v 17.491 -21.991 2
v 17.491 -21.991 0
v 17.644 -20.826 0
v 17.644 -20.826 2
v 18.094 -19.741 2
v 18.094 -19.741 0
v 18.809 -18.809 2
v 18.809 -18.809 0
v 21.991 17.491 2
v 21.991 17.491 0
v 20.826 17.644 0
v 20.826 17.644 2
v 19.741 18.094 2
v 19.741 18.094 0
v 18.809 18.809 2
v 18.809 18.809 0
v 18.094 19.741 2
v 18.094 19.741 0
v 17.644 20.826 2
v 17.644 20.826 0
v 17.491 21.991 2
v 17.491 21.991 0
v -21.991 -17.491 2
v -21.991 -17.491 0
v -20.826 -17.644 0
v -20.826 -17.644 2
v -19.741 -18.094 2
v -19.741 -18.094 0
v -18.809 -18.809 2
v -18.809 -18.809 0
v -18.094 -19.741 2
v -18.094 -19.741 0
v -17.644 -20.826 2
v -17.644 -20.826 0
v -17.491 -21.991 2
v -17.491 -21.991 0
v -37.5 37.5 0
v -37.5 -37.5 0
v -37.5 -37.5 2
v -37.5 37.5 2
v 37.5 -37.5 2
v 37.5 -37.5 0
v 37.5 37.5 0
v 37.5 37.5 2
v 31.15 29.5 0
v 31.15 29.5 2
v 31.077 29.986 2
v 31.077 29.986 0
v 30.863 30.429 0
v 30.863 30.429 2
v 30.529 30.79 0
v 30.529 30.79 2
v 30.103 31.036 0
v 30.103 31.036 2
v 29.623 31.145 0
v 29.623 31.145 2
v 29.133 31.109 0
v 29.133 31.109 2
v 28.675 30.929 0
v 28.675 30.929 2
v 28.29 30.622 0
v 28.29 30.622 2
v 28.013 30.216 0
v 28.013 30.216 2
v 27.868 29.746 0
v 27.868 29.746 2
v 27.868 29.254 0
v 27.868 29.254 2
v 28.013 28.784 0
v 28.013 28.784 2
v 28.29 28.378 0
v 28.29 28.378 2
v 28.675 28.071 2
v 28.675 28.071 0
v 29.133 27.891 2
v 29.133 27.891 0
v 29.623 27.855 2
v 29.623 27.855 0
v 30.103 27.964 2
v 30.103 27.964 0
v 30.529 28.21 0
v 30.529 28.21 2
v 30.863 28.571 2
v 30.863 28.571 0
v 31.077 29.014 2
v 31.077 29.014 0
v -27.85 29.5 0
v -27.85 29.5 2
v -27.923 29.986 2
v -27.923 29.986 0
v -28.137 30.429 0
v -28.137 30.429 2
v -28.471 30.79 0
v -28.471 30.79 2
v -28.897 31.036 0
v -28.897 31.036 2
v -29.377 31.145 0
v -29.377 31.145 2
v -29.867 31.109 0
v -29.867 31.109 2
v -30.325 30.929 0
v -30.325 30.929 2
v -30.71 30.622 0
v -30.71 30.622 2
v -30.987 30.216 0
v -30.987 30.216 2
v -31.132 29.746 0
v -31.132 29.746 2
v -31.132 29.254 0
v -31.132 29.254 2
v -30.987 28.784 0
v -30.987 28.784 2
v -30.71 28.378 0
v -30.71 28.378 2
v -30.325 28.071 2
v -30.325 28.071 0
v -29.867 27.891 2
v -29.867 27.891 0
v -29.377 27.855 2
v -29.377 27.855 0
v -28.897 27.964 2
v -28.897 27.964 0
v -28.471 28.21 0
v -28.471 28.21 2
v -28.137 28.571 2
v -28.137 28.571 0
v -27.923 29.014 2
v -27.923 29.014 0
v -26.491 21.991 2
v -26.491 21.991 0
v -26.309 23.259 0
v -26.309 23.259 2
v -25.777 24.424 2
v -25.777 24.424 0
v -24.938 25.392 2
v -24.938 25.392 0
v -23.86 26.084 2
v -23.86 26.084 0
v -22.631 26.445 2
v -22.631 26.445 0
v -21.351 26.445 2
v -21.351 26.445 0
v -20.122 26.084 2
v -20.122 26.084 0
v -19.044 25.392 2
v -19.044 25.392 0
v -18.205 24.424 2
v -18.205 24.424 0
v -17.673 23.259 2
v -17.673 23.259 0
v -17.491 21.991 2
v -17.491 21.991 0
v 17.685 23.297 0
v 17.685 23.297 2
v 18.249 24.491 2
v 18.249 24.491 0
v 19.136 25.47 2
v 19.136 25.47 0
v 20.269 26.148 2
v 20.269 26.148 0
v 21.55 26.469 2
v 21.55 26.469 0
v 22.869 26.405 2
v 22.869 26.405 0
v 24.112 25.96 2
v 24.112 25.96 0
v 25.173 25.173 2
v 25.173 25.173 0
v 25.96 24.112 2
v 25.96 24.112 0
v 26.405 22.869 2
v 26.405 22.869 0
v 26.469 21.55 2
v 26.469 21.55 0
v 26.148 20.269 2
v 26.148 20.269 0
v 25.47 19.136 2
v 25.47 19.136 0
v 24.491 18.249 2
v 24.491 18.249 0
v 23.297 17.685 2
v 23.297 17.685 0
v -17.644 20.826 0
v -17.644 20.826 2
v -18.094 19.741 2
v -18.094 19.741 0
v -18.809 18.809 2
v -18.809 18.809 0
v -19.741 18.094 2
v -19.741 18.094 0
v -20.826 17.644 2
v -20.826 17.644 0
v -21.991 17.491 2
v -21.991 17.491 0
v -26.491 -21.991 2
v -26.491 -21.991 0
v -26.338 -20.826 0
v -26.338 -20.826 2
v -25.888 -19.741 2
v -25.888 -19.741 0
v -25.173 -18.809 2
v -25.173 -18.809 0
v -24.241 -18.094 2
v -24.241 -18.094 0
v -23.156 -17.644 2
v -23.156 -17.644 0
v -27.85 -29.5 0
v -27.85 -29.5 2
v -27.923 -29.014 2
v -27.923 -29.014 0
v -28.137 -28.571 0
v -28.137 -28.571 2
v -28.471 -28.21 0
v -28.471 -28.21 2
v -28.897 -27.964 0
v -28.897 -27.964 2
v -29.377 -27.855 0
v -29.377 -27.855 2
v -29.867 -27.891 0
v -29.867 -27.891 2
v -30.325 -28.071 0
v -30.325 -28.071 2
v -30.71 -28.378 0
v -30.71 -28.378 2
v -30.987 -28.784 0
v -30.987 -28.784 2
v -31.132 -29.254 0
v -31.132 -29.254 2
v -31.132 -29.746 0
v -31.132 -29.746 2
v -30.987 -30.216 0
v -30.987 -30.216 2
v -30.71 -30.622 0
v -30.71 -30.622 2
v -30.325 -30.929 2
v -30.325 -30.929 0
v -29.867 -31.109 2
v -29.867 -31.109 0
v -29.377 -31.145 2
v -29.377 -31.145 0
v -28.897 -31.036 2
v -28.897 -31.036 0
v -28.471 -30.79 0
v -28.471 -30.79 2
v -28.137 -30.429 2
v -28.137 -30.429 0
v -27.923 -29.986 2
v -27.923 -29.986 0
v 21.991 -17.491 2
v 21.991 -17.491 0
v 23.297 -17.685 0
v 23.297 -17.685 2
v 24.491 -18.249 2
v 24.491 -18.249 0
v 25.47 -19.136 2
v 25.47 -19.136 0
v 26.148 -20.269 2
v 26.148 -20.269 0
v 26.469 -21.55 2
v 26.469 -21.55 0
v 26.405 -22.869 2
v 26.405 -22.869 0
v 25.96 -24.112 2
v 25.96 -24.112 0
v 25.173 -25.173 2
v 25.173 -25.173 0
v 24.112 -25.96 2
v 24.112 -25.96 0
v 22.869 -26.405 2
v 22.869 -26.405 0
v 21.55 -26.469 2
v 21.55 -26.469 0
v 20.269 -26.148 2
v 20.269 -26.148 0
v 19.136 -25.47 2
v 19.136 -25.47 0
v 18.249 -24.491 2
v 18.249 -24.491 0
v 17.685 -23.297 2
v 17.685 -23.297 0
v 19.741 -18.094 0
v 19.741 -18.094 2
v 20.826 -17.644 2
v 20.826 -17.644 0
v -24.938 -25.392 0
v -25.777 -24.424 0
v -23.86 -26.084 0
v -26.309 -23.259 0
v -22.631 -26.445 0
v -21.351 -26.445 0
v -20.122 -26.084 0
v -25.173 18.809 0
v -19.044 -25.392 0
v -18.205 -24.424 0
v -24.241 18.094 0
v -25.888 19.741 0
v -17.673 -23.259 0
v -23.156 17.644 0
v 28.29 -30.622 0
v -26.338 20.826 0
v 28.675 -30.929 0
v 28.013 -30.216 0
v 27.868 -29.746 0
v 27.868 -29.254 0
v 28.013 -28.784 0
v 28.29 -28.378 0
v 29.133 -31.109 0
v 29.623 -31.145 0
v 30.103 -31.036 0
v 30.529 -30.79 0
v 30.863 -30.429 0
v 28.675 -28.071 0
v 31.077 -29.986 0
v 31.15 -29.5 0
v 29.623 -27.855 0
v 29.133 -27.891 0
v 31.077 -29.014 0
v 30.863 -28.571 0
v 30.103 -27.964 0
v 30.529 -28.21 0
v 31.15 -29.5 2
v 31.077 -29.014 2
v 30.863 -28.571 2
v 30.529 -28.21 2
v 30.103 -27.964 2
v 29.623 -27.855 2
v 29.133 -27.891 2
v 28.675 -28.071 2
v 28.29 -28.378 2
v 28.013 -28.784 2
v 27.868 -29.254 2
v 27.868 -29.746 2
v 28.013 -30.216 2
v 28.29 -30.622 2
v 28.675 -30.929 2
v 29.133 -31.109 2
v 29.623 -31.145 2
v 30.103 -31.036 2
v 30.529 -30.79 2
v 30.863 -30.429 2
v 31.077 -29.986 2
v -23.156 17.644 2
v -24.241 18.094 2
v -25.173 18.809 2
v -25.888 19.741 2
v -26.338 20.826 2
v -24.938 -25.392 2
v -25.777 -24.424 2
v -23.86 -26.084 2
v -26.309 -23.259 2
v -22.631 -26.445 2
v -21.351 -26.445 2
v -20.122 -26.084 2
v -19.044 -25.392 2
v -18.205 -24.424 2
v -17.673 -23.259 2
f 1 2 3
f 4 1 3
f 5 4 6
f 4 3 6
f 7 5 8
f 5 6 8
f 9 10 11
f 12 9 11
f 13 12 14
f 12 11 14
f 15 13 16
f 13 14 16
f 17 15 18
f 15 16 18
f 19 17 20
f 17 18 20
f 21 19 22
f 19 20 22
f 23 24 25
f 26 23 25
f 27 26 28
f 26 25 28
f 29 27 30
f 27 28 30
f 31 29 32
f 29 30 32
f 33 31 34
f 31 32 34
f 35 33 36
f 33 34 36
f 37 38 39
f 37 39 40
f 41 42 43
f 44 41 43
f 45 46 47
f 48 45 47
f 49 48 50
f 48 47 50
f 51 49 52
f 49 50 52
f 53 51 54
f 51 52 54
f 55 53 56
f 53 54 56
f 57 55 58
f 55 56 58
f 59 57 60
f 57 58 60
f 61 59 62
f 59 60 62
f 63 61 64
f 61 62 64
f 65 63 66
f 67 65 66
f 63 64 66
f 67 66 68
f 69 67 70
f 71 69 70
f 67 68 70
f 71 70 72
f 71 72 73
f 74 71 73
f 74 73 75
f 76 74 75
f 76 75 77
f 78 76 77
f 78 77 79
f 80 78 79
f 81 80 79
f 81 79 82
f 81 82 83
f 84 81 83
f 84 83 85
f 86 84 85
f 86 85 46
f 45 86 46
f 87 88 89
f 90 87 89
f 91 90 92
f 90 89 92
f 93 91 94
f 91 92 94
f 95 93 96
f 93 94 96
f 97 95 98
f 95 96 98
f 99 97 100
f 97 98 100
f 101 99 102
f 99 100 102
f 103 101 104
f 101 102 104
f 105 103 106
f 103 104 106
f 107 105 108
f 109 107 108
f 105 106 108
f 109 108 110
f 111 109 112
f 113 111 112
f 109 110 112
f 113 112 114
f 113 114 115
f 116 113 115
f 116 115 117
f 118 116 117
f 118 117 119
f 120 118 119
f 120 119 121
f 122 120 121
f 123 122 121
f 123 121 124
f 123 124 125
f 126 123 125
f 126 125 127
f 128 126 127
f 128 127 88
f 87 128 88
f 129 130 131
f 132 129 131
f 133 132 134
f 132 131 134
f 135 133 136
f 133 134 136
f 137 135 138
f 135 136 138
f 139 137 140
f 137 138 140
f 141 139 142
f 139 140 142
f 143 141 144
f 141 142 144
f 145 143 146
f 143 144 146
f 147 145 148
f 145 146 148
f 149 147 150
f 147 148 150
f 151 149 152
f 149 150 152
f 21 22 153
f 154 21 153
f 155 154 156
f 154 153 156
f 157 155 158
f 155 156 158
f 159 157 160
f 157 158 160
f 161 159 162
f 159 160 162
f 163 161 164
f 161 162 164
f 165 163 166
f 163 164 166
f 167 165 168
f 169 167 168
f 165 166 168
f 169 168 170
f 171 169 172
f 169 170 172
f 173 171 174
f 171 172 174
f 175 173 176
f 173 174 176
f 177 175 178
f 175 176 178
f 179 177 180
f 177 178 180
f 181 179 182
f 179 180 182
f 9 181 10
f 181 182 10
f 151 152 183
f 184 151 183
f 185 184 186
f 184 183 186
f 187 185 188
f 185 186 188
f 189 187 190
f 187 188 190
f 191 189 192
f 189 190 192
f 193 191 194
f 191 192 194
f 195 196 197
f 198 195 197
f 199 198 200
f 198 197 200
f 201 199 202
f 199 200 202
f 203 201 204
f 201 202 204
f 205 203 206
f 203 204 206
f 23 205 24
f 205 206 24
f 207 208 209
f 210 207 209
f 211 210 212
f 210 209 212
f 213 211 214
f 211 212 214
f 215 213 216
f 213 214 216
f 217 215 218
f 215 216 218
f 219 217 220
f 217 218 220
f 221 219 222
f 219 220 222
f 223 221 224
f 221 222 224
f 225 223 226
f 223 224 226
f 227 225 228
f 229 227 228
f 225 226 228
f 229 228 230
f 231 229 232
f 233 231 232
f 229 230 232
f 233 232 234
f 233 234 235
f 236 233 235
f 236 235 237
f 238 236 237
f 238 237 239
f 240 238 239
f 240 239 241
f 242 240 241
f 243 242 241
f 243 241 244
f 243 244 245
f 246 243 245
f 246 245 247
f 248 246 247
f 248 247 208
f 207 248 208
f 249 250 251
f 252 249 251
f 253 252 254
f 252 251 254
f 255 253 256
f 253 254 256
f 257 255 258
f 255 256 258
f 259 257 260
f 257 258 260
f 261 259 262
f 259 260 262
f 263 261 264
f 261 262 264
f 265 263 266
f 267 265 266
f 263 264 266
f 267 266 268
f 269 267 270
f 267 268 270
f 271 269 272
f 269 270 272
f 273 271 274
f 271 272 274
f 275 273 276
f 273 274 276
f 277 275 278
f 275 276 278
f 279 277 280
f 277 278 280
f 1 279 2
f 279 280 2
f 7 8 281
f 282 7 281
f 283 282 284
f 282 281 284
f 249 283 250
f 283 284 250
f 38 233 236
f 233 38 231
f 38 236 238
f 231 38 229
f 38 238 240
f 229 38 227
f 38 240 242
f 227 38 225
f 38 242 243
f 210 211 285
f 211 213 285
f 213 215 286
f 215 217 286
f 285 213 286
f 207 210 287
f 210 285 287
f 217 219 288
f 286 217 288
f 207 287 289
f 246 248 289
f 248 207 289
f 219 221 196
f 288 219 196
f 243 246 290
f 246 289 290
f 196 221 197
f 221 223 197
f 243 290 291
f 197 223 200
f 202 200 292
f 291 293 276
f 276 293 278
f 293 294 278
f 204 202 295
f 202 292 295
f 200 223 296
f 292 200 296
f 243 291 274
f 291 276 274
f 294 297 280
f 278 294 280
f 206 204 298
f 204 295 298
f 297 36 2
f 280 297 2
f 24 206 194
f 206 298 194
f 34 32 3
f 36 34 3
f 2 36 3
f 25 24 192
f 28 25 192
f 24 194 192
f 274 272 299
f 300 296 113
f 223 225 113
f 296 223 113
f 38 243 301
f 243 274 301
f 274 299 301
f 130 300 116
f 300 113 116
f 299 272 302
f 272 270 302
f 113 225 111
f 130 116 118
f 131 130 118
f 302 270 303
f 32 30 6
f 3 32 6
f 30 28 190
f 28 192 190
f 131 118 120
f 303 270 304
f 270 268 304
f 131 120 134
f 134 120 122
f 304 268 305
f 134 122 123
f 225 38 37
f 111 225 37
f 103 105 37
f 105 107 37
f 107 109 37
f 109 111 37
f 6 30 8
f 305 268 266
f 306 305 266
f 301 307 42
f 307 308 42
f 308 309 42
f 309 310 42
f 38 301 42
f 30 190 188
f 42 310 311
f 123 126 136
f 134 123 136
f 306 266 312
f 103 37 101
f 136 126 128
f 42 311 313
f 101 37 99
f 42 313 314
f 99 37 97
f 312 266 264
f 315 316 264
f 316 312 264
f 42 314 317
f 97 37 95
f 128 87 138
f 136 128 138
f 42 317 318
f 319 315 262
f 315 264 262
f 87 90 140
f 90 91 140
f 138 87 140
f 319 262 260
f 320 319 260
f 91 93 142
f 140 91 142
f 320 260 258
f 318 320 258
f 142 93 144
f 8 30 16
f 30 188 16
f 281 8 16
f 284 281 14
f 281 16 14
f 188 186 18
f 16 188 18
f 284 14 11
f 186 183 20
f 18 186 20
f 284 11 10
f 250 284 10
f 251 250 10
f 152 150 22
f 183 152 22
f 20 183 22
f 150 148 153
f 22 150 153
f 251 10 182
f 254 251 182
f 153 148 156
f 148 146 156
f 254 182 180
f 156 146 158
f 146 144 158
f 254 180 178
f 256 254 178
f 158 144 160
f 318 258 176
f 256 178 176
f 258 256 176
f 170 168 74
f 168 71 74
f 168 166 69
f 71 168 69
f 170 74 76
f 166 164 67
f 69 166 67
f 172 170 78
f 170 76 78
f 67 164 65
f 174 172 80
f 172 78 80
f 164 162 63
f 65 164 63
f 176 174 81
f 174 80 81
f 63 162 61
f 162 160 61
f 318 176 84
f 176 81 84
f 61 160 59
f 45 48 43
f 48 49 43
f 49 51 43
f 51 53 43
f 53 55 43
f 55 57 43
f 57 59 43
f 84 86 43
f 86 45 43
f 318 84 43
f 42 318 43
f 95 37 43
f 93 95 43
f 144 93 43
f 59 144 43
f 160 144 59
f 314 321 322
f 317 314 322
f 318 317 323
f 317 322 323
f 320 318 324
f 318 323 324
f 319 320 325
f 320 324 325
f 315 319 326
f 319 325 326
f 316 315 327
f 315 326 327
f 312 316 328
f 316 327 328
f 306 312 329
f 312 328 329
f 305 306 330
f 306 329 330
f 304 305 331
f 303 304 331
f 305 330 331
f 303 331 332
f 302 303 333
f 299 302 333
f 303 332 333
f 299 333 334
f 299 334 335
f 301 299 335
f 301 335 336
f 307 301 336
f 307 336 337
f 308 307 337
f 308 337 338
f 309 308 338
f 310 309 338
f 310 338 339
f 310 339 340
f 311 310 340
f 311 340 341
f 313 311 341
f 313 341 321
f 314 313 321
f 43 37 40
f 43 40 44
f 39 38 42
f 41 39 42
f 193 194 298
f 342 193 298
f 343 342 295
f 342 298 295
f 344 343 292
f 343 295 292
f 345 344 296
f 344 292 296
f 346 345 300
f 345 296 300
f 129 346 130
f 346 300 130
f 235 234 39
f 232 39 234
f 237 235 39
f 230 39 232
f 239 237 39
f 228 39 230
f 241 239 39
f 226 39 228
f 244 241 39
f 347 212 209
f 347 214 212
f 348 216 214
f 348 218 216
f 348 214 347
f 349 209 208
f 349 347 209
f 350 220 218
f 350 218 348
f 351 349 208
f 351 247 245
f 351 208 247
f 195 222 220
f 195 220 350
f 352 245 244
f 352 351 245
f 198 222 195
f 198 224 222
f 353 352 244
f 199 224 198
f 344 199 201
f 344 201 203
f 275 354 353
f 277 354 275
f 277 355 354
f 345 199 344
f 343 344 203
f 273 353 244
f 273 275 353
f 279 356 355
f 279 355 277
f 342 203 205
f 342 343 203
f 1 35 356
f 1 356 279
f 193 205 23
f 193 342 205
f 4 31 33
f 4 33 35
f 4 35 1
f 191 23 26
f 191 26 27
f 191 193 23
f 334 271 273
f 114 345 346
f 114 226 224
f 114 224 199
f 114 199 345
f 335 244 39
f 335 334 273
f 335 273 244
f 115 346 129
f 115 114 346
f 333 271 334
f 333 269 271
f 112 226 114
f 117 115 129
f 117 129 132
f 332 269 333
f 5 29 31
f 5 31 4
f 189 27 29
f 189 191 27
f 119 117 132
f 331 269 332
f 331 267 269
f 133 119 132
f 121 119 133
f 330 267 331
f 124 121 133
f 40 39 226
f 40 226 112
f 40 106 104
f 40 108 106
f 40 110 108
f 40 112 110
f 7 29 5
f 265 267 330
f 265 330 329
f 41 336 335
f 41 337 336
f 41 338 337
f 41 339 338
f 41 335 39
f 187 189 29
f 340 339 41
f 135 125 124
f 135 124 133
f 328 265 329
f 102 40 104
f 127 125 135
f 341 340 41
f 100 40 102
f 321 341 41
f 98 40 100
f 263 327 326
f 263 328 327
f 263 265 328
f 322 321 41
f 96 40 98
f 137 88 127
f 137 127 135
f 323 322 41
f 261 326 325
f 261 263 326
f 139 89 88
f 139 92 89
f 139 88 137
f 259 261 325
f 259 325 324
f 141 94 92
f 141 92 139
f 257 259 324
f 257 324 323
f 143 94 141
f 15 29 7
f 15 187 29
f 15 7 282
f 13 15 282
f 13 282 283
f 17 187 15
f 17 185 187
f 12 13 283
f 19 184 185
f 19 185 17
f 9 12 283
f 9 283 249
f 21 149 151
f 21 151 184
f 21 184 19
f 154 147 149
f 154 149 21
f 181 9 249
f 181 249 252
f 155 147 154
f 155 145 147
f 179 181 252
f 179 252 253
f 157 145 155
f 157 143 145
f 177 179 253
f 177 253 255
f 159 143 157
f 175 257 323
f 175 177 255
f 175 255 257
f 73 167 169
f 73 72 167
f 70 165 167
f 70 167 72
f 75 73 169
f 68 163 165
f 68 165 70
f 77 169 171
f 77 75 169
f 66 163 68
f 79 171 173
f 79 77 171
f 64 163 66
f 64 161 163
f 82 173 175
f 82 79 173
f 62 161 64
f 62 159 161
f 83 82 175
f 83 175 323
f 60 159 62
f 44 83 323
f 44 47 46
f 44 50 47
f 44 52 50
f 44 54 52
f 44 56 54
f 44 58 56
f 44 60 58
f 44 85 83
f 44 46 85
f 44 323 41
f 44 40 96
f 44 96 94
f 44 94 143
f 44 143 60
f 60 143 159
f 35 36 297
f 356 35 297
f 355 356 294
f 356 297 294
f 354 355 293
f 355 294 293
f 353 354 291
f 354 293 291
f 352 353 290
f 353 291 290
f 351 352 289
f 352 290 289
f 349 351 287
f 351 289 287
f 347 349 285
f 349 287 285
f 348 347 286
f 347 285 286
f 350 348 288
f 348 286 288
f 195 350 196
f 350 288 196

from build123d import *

# Parameters (mm, degrees)
SKETCH_1_W          = 75
SKETCH_1_H          = 75
EXTRUDE_1_DEPTH     = 2
M4X0_7_1_D          = 3.3
M4X0_7_1_DEPTH      = 11.5
M4X0_7_1_TIP        = 0.991420021
CUT_EXTRUDE_1_DEPTH = 80


with BuildPart() as part:
    # ｽｹｯﾁ1 → ﾎﾞｽ - 押し出し1 (new body)
    with BuildSketch(Plane.XY):
        Rectangle(SKETCH_1_W, SKETCH_1_H)
    extrude(amount=EXTRUDE_1_DEPTH)

    # M4x0.7 ねじ穴1
    with Locations(Plane(origin=(-29.5, -29.5, 0), x_dir=(-1, 0, 0), z_dir=(0, 0, -1))):
        with Locations((0, 0), (0, 59), (-59, 59), (-59, 0)):
            Hole(M4X0_7_1_D / 2, depth=M4X0_7_1_DEPTH)
            with Locations((0, 0, -(M4X0_7_1_DEPTH + M4X0_7_1_TIP / 2))):  # 118° drill point
                Cone(0, M4X0_7_1_D / 2, M4X0_7_1_TIP, mode=Mode.SUBTRACT)

    # ｽｹｯﾁ5 → ｶｯﾄ - 押し出し1 (cut)
    with BuildSketch(Plane(origin=(0, 0, 0), x_dir=(-1, 0, 0), z_dir=(0, 0, -1))):
        with BuildLine():
            ThreePointArc((21.991020895, -17.491020895), (18.80904038, -18.80904038), (17.491020895, -21.991020895))
            Line((17.491020895, -21.991020895), (21.991020895, -21.991020895))
            Line((21.991020895, -21.991020895), (21.991020895, -17.491020895))
        make_face()
        with BuildLine():
            Line((21.991020895, -21.991020895), (17.491020895, -21.991020895))
            ThreePointArc((17.491020895, -21.991020895), (21.991020895, -26.491020895), (26.491020895, -21.991020895))
            ThreePointArc((26.491020895, -21.991020895), (25.17300141, -18.80904038), (21.991020895, -17.491020895))
            Line((21.991020895, -17.491020895), (21.991020895, -21.991020895))
        make_face()
        with BuildLine():
            ThreePointArc((17.491020895, 21.991020895), (18.80904038, 18.80904038), (21.991020895, 17.491020895))
            Line((21.991020895, 17.491020895), (21.991020895, 21.991020895))
            Line((21.991020895, 21.991020895), (17.491020895, 21.991020895))
        make_face()
        with BuildLine():
            Line((21.991020895, 21.991020895), (21.991020895, 17.491020895))
            ThreePointArc((21.991020895, 17.491020895), (25.17300141, 18.80904038), (26.491020895, 21.991020895))
            ThreePointArc((26.491020895, 21.991020895), (21.991020895, 26.491020895), (17.491020895, 21.991020895))
            Line((17.491020895, 21.991020895), (21.991020895, 21.991020895))
        make_face()
        with BuildLine():
            ThreePointArc((-17.491020895, 21.991020895), (-25.17300141, 25.17300141), (-21.991020895, 17.491020895))
            Line((-21.991020895, 17.491020895), (-21.991020895, 21.991020895))
            Line((-21.991020895, 21.991020895), (-17.491020895, 21.991020895))
        make_face()
        with BuildLine():
            Line((-21.991020895, 21.991020895), (-21.991020895, 17.491020895))
            ThreePointArc((-21.991020895, 17.491020895), (-18.80904038, 18.80904038), (-17.491020895, 21.991020895))
            Line((-17.491020895, 21.991020895), (-21.991020895, 21.991020895))
        make_face()
        with BuildLine():
            Line((-17.491020895, -21.991020895), (-21.991020895, -21.991020895))
            Line((-21.991020895, -21.991020895), (-21.991020895, -17.491020895))
            ThreePointArc((-21.991020895, -17.491020895), (-25.17300141, -25.17300141), (-17.491020895, -21.991020895))
        make_face()
        with BuildLine():
            Line((-21.991020895, -21.991020895), (-18.80904038, -18.80904038))
            ThreePointArc((-18.80904038, -18.80904038), (-20.268945449, -17.833562999), (-21.991020895, -17.491020895))
            Line((-21.991020895, -17.491020895), (-21.991020895, -21.991020895))
        make_face()
        with BuildLine():
            ThreePointArc((-17.491020895, -21.991020895), (-17.833562999, -20.268945449), (-18.80904038, -18.80904038))
            Line((-18.80904038, -18.80904038), (-21.991020895, -21.991020895))
            Line((-21.991020895, -21.991020895), (-17.491020895, -21.991020895))
        make_face()
    extrude(amount=-CUT_EXTRUDE_1_DEPTH, mode=Mode.SUBTRACT)


solid = part.part
